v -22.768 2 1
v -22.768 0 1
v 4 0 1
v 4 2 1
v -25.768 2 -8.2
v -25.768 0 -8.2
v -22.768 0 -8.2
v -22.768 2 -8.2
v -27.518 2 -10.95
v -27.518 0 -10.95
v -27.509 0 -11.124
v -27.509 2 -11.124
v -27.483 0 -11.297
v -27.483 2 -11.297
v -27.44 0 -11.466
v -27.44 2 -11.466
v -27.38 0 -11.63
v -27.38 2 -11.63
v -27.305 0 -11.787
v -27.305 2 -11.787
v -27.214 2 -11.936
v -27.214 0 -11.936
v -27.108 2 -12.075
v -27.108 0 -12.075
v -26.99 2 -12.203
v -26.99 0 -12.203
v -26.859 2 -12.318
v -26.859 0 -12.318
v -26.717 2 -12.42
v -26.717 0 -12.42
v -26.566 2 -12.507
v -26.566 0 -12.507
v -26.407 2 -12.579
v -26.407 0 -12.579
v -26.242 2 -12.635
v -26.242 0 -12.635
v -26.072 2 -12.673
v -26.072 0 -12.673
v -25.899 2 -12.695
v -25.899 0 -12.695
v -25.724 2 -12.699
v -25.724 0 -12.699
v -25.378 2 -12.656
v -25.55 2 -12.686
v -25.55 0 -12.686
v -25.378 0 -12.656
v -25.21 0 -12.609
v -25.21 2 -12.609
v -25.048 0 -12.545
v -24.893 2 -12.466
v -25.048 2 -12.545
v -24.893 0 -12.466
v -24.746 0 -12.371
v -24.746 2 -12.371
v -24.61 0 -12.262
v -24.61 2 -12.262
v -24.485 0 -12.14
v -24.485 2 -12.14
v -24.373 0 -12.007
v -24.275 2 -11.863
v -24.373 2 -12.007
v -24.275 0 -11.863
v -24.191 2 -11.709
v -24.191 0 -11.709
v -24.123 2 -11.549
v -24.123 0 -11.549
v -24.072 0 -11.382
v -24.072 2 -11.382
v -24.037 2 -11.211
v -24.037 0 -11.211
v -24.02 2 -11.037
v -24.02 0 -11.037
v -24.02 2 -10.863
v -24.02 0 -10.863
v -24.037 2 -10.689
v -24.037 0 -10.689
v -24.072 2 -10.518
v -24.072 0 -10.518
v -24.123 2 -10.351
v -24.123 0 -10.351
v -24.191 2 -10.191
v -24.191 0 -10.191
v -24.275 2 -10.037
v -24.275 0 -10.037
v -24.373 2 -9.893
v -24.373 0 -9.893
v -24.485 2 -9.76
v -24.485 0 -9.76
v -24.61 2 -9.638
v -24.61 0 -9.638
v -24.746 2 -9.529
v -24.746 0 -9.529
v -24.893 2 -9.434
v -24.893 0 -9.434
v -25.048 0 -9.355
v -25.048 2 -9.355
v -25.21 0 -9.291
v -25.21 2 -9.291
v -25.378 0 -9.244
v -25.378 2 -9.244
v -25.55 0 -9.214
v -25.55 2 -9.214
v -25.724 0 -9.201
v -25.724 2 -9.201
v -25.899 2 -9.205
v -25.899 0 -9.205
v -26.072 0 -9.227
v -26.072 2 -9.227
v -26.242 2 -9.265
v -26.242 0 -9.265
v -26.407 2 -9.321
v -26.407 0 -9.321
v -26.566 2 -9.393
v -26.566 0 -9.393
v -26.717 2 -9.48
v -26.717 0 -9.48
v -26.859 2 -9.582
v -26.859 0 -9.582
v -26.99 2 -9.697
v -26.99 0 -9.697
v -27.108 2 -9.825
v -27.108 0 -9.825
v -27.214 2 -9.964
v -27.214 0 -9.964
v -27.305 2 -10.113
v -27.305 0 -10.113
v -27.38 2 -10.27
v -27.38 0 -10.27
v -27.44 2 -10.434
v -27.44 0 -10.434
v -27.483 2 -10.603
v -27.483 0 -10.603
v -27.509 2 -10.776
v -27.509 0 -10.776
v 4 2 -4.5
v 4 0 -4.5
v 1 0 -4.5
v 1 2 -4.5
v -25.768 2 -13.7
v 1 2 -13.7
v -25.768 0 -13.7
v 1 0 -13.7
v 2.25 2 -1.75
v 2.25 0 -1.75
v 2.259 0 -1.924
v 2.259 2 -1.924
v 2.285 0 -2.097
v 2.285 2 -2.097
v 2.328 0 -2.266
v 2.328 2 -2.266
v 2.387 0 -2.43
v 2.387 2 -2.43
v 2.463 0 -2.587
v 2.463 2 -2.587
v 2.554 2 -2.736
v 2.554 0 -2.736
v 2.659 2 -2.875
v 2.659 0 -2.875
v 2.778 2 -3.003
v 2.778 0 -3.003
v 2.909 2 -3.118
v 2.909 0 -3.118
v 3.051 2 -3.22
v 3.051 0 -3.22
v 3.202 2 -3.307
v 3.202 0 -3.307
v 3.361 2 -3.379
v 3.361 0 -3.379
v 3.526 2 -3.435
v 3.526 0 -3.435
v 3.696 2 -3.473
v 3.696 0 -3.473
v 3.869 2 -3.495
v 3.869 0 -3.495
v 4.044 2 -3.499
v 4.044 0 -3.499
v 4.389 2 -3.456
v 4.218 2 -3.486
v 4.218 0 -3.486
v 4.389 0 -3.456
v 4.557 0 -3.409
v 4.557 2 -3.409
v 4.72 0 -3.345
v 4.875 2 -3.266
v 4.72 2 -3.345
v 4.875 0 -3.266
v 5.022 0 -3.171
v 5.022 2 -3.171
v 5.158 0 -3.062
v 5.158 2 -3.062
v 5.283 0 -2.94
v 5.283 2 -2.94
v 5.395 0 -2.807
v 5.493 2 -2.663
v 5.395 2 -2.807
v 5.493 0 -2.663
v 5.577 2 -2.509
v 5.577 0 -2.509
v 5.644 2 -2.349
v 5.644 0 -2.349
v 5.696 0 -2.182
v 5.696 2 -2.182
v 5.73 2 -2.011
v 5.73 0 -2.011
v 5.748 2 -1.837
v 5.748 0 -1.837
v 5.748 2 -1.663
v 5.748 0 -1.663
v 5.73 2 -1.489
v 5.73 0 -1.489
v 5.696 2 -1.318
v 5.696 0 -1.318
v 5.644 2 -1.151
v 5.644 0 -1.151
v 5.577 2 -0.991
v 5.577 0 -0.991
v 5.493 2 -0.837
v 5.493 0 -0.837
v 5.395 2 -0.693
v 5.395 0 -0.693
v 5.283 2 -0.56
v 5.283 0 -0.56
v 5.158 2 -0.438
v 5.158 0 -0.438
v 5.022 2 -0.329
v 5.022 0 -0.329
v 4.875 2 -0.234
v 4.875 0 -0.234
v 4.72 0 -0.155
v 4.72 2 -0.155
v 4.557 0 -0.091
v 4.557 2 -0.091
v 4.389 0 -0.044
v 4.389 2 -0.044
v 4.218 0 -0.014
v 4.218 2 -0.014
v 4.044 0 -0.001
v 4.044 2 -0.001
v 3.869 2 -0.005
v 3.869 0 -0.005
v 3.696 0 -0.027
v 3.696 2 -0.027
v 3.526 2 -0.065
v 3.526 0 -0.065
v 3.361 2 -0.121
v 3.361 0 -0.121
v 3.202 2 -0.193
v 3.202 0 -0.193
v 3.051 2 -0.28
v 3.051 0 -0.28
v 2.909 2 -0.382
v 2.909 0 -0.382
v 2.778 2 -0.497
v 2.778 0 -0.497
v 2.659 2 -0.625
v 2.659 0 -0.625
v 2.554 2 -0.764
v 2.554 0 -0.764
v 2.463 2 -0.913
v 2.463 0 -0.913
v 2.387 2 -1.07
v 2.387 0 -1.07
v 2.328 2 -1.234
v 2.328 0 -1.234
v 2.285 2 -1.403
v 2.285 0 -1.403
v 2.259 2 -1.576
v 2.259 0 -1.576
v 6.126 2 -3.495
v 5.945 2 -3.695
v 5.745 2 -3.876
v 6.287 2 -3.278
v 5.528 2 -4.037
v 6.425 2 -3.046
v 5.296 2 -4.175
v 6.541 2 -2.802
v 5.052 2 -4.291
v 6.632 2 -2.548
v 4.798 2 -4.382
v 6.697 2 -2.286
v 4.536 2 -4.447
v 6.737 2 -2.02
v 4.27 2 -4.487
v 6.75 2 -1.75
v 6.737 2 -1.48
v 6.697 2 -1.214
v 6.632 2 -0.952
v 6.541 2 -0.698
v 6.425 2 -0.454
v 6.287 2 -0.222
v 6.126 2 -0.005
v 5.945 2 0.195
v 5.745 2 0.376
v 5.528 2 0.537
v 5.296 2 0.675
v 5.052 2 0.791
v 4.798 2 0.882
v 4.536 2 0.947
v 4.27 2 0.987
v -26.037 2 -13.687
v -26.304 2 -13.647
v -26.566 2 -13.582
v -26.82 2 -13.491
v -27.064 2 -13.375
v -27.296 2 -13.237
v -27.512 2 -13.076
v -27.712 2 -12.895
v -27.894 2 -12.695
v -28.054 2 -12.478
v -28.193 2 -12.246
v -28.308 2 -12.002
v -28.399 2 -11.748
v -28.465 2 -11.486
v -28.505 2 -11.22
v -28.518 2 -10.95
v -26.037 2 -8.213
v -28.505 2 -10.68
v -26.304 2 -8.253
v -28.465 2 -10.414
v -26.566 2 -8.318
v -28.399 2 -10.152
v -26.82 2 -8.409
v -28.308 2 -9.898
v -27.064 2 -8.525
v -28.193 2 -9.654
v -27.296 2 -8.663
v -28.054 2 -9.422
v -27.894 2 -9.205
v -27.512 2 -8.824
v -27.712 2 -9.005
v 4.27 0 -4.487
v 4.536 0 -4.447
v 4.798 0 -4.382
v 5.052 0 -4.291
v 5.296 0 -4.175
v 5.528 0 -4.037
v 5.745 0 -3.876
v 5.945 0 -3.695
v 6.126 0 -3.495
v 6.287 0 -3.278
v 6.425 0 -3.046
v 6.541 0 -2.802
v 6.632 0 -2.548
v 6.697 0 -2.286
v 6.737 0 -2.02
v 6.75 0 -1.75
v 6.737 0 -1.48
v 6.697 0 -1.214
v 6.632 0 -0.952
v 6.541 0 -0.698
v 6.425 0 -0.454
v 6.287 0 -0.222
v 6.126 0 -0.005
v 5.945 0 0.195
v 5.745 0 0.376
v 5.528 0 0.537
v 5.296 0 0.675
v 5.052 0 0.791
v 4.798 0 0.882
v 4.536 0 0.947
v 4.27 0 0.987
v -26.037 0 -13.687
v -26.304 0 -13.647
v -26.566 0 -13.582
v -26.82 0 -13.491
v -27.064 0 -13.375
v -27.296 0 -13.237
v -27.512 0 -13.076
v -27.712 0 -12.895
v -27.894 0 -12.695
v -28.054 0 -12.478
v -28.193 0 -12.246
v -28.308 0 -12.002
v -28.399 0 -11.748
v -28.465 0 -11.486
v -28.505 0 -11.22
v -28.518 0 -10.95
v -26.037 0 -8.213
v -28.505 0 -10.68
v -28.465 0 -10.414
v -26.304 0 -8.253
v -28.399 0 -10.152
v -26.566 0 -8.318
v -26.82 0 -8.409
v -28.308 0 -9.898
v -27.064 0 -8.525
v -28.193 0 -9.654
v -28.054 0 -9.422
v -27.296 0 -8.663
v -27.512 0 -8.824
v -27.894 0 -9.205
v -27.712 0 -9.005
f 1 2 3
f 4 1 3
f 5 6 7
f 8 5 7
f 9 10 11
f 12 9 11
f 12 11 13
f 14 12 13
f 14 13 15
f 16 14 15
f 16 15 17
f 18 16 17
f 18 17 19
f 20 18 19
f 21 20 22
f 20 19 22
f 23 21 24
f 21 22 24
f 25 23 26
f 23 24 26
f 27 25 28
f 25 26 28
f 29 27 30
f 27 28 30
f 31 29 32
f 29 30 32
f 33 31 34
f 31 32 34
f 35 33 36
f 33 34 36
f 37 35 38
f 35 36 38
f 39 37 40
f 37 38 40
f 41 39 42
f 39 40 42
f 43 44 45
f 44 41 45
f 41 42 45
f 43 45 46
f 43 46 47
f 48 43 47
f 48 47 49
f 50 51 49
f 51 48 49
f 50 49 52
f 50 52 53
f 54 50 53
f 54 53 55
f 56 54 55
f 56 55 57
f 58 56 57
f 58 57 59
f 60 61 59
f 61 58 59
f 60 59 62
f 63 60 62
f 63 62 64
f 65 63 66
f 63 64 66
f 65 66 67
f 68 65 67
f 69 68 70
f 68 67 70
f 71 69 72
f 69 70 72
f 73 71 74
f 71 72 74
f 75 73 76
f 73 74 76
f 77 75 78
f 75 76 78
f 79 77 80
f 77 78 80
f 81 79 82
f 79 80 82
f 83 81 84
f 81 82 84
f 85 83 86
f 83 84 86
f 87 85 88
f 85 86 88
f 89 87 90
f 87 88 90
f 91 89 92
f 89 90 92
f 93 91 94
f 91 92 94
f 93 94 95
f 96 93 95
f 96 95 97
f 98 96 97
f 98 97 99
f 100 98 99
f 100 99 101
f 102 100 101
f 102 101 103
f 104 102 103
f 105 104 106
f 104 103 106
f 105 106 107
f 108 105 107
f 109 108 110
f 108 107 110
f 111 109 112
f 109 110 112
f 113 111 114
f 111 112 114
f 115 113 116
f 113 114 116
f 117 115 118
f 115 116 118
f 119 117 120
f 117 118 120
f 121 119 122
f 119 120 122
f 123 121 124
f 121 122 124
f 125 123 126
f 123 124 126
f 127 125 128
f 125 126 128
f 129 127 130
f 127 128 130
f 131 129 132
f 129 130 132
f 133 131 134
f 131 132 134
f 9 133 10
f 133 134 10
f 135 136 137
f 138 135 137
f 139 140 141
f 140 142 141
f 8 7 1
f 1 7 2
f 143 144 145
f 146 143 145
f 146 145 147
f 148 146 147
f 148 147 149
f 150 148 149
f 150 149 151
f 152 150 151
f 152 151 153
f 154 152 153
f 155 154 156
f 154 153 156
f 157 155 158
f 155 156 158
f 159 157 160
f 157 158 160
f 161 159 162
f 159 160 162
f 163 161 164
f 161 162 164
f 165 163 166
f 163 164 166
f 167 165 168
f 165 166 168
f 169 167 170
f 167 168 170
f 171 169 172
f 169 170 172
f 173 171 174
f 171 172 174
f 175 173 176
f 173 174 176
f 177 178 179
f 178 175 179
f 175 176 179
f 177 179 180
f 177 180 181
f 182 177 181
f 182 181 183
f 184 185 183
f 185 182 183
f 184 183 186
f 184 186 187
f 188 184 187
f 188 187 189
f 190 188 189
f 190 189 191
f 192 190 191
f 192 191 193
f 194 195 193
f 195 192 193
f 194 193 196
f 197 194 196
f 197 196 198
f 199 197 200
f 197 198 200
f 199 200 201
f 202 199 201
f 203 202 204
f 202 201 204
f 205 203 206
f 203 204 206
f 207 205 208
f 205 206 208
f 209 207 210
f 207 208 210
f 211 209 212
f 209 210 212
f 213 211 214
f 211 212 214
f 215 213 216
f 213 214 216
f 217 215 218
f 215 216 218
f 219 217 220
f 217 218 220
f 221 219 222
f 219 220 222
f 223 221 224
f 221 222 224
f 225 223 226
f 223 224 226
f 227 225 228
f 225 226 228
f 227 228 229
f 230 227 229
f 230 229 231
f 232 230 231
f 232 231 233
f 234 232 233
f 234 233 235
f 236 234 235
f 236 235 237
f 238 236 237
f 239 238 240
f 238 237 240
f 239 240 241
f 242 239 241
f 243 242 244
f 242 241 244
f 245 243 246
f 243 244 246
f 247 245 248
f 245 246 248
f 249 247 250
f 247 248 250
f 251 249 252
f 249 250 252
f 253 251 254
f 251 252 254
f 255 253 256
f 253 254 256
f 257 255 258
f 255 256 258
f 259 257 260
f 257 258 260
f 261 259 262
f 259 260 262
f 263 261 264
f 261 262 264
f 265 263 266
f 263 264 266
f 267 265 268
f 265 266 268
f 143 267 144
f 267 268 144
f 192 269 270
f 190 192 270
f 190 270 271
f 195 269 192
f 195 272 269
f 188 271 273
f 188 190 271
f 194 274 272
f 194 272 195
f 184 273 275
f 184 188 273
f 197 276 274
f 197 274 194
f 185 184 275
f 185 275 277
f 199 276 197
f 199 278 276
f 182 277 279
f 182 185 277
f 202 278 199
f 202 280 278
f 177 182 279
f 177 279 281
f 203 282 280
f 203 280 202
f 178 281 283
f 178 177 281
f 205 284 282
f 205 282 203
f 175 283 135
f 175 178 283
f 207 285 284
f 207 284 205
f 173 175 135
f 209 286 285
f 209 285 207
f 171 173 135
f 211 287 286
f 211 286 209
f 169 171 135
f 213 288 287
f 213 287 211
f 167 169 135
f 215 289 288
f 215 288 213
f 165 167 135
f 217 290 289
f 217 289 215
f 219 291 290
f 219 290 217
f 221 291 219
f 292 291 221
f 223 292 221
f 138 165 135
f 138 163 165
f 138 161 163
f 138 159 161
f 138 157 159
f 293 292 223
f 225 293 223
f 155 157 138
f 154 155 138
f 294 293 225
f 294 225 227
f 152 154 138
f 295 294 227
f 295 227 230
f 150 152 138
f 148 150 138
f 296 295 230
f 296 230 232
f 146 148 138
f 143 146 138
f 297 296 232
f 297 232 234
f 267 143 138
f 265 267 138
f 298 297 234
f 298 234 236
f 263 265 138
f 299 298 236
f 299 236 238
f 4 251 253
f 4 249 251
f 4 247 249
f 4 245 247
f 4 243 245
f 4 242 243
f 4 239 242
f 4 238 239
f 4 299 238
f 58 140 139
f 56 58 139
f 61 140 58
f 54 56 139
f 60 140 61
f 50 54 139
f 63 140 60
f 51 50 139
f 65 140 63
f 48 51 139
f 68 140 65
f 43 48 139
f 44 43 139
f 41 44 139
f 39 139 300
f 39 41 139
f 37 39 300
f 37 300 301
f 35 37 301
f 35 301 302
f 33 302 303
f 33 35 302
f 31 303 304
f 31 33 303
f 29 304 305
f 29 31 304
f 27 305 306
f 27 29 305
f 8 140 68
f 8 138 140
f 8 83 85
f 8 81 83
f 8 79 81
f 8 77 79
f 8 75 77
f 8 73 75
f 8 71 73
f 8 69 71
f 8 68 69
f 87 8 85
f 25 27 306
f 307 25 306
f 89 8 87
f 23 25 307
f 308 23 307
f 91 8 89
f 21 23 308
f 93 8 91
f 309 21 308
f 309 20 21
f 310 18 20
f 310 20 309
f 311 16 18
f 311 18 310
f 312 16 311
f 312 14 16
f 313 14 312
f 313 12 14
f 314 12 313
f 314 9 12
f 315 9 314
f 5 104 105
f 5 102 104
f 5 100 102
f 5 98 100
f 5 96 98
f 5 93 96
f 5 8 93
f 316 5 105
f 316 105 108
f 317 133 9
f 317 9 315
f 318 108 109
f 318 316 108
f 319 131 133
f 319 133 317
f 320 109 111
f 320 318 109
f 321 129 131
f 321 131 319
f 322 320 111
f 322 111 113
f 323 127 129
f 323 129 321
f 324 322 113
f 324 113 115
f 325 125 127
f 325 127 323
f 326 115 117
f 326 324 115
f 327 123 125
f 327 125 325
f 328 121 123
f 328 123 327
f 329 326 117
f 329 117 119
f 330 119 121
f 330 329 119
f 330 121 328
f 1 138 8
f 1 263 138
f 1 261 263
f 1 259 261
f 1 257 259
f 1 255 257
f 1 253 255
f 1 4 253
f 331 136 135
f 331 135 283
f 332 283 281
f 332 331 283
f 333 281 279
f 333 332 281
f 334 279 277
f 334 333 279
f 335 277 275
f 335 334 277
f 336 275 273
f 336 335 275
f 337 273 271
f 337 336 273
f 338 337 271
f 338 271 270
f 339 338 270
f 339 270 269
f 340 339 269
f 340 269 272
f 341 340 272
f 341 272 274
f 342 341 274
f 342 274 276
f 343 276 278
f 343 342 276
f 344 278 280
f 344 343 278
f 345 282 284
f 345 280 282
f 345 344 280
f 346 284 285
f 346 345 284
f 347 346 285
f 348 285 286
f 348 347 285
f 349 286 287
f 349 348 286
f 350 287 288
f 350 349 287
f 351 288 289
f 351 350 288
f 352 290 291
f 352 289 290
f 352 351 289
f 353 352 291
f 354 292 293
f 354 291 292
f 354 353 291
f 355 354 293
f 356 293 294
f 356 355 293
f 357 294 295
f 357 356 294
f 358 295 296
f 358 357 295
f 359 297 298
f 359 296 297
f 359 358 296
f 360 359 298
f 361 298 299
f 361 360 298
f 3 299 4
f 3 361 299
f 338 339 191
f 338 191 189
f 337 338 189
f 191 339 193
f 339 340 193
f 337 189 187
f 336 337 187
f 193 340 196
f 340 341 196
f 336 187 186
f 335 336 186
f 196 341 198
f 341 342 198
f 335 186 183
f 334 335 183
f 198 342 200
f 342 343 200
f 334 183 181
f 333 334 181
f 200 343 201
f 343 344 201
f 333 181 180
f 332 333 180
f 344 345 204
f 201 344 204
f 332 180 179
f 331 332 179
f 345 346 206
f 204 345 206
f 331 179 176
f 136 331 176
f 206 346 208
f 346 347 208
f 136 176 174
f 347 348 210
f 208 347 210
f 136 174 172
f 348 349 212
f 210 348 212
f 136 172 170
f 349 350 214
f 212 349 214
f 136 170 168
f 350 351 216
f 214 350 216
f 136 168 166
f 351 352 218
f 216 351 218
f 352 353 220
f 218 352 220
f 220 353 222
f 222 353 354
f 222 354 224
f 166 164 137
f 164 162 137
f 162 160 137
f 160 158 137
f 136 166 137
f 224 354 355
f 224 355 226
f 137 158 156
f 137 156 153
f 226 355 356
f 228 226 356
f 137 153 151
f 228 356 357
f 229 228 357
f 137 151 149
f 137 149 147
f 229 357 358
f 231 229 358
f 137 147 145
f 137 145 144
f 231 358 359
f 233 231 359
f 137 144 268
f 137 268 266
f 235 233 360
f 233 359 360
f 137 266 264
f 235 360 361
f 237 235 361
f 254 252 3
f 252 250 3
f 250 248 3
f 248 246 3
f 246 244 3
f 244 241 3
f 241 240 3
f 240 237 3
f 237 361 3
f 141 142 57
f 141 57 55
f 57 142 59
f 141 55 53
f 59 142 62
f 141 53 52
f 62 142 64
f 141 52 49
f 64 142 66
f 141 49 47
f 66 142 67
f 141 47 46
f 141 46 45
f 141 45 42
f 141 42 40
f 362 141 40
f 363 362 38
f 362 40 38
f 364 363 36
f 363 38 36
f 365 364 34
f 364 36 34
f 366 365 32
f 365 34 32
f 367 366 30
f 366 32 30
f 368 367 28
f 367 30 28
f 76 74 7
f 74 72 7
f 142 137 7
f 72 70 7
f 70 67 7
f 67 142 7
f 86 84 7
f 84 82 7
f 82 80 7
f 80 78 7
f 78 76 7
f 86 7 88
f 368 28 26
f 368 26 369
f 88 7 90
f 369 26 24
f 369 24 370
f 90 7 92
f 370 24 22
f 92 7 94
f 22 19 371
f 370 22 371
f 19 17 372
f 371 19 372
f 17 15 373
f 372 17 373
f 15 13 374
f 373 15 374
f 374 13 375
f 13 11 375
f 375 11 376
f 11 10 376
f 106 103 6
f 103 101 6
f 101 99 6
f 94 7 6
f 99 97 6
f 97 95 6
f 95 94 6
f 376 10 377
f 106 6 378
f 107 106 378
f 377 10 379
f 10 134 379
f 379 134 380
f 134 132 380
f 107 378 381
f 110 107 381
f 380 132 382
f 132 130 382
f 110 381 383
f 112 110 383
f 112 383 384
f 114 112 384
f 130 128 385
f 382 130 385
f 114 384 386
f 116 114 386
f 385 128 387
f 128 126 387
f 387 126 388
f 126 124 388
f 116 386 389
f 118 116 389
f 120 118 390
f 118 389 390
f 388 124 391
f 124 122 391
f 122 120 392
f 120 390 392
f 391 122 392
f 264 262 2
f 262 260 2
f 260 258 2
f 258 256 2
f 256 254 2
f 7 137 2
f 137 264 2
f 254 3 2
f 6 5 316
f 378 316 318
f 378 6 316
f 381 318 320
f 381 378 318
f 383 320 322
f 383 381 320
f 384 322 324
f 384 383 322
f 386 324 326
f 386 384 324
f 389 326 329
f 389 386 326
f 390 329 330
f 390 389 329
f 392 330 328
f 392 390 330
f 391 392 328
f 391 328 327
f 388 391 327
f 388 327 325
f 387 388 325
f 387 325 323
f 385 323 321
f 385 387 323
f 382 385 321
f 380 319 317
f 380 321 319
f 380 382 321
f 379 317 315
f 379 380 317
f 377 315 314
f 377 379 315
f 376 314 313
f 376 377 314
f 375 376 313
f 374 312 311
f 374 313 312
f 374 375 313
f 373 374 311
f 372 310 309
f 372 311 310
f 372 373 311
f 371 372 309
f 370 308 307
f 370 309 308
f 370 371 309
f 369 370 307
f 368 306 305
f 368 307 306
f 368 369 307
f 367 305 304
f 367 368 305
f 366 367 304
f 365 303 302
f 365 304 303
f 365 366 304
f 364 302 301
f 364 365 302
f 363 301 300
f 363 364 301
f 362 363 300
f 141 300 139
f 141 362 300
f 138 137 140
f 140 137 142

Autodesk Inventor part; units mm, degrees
ref_plane "YZ Plane" through (0, 0, 0) normal (1, 0, 0) x (0, 1, 0)
ref_plane "XZ Plane" through (0, 0, 0) normal (0, 1, 0) x (-1, 0, 0)
ref_plane "XY Plane" through (0, 0, 0) normal (0, 0, 1) x (1, 0, 0)
sketch "Sketch1" plane through (0, 0, 0) normal (0, 1, 0) x (-1, 0, 0)
  line L0 (0, 0) -> (21.7678, 0)
  line L1 (21.7678, 0) -> (21.7678, -12.7)
  line L2 (21.7678, -12.7) -> (0, -12.7)
  line L3 (0, -12.7) -> (0, 0)
  circle A0 centre (25.7678, -10.95) radius 1.75
  circle A1 centre (-4, -1.75) radius 1.75
  circle A2 centre (25.7678, -10.95) radius 2.75
  circle A3 centre (-4, -1.75) radius 2.75
  line L4 (-1, -13.7) -> (22.7678, -13.7)
  line L5 (22.7678, -13.7) -> (22.7678, 1)
  line L6 (22.7678, 1) -> (-1, 1)
  line L7 (-1, 1) -> (-1, -13.7)
  line L8 (25.7678, -13.7) -> (22.7678, -13.7)
  line L9 (25.7678, -8.2) -> (22.7678, -8.2)
  line L10 (-4, 1) -> (-1, 1)
  line L11 (-4, -4.5) -> (-1, -4.5)
  dimension "d0" = 21.7678
  dimension "d1" = 12.7
  dimension "d2" = 3.5
  dimension "d3" = 3.5
  dimension "d4" = 4
  dimension "d5" = 4
  dimension "d6" = 5.5
  dimension "d7" = 5.5
extrude "Extrusion1" add sketch "Sketch1" along normal blind 2 contours L0 L1 L2 L3 | A2 | A2 L8 L5 L9 | L5 L4 L7 L6 | L7 L11 A3 L10 | A3
equation "\"d3\" = d2"
equation "\"d5\" = d4"
equation "\"d7\" = d6"
properties part number "HDMI Mount"
